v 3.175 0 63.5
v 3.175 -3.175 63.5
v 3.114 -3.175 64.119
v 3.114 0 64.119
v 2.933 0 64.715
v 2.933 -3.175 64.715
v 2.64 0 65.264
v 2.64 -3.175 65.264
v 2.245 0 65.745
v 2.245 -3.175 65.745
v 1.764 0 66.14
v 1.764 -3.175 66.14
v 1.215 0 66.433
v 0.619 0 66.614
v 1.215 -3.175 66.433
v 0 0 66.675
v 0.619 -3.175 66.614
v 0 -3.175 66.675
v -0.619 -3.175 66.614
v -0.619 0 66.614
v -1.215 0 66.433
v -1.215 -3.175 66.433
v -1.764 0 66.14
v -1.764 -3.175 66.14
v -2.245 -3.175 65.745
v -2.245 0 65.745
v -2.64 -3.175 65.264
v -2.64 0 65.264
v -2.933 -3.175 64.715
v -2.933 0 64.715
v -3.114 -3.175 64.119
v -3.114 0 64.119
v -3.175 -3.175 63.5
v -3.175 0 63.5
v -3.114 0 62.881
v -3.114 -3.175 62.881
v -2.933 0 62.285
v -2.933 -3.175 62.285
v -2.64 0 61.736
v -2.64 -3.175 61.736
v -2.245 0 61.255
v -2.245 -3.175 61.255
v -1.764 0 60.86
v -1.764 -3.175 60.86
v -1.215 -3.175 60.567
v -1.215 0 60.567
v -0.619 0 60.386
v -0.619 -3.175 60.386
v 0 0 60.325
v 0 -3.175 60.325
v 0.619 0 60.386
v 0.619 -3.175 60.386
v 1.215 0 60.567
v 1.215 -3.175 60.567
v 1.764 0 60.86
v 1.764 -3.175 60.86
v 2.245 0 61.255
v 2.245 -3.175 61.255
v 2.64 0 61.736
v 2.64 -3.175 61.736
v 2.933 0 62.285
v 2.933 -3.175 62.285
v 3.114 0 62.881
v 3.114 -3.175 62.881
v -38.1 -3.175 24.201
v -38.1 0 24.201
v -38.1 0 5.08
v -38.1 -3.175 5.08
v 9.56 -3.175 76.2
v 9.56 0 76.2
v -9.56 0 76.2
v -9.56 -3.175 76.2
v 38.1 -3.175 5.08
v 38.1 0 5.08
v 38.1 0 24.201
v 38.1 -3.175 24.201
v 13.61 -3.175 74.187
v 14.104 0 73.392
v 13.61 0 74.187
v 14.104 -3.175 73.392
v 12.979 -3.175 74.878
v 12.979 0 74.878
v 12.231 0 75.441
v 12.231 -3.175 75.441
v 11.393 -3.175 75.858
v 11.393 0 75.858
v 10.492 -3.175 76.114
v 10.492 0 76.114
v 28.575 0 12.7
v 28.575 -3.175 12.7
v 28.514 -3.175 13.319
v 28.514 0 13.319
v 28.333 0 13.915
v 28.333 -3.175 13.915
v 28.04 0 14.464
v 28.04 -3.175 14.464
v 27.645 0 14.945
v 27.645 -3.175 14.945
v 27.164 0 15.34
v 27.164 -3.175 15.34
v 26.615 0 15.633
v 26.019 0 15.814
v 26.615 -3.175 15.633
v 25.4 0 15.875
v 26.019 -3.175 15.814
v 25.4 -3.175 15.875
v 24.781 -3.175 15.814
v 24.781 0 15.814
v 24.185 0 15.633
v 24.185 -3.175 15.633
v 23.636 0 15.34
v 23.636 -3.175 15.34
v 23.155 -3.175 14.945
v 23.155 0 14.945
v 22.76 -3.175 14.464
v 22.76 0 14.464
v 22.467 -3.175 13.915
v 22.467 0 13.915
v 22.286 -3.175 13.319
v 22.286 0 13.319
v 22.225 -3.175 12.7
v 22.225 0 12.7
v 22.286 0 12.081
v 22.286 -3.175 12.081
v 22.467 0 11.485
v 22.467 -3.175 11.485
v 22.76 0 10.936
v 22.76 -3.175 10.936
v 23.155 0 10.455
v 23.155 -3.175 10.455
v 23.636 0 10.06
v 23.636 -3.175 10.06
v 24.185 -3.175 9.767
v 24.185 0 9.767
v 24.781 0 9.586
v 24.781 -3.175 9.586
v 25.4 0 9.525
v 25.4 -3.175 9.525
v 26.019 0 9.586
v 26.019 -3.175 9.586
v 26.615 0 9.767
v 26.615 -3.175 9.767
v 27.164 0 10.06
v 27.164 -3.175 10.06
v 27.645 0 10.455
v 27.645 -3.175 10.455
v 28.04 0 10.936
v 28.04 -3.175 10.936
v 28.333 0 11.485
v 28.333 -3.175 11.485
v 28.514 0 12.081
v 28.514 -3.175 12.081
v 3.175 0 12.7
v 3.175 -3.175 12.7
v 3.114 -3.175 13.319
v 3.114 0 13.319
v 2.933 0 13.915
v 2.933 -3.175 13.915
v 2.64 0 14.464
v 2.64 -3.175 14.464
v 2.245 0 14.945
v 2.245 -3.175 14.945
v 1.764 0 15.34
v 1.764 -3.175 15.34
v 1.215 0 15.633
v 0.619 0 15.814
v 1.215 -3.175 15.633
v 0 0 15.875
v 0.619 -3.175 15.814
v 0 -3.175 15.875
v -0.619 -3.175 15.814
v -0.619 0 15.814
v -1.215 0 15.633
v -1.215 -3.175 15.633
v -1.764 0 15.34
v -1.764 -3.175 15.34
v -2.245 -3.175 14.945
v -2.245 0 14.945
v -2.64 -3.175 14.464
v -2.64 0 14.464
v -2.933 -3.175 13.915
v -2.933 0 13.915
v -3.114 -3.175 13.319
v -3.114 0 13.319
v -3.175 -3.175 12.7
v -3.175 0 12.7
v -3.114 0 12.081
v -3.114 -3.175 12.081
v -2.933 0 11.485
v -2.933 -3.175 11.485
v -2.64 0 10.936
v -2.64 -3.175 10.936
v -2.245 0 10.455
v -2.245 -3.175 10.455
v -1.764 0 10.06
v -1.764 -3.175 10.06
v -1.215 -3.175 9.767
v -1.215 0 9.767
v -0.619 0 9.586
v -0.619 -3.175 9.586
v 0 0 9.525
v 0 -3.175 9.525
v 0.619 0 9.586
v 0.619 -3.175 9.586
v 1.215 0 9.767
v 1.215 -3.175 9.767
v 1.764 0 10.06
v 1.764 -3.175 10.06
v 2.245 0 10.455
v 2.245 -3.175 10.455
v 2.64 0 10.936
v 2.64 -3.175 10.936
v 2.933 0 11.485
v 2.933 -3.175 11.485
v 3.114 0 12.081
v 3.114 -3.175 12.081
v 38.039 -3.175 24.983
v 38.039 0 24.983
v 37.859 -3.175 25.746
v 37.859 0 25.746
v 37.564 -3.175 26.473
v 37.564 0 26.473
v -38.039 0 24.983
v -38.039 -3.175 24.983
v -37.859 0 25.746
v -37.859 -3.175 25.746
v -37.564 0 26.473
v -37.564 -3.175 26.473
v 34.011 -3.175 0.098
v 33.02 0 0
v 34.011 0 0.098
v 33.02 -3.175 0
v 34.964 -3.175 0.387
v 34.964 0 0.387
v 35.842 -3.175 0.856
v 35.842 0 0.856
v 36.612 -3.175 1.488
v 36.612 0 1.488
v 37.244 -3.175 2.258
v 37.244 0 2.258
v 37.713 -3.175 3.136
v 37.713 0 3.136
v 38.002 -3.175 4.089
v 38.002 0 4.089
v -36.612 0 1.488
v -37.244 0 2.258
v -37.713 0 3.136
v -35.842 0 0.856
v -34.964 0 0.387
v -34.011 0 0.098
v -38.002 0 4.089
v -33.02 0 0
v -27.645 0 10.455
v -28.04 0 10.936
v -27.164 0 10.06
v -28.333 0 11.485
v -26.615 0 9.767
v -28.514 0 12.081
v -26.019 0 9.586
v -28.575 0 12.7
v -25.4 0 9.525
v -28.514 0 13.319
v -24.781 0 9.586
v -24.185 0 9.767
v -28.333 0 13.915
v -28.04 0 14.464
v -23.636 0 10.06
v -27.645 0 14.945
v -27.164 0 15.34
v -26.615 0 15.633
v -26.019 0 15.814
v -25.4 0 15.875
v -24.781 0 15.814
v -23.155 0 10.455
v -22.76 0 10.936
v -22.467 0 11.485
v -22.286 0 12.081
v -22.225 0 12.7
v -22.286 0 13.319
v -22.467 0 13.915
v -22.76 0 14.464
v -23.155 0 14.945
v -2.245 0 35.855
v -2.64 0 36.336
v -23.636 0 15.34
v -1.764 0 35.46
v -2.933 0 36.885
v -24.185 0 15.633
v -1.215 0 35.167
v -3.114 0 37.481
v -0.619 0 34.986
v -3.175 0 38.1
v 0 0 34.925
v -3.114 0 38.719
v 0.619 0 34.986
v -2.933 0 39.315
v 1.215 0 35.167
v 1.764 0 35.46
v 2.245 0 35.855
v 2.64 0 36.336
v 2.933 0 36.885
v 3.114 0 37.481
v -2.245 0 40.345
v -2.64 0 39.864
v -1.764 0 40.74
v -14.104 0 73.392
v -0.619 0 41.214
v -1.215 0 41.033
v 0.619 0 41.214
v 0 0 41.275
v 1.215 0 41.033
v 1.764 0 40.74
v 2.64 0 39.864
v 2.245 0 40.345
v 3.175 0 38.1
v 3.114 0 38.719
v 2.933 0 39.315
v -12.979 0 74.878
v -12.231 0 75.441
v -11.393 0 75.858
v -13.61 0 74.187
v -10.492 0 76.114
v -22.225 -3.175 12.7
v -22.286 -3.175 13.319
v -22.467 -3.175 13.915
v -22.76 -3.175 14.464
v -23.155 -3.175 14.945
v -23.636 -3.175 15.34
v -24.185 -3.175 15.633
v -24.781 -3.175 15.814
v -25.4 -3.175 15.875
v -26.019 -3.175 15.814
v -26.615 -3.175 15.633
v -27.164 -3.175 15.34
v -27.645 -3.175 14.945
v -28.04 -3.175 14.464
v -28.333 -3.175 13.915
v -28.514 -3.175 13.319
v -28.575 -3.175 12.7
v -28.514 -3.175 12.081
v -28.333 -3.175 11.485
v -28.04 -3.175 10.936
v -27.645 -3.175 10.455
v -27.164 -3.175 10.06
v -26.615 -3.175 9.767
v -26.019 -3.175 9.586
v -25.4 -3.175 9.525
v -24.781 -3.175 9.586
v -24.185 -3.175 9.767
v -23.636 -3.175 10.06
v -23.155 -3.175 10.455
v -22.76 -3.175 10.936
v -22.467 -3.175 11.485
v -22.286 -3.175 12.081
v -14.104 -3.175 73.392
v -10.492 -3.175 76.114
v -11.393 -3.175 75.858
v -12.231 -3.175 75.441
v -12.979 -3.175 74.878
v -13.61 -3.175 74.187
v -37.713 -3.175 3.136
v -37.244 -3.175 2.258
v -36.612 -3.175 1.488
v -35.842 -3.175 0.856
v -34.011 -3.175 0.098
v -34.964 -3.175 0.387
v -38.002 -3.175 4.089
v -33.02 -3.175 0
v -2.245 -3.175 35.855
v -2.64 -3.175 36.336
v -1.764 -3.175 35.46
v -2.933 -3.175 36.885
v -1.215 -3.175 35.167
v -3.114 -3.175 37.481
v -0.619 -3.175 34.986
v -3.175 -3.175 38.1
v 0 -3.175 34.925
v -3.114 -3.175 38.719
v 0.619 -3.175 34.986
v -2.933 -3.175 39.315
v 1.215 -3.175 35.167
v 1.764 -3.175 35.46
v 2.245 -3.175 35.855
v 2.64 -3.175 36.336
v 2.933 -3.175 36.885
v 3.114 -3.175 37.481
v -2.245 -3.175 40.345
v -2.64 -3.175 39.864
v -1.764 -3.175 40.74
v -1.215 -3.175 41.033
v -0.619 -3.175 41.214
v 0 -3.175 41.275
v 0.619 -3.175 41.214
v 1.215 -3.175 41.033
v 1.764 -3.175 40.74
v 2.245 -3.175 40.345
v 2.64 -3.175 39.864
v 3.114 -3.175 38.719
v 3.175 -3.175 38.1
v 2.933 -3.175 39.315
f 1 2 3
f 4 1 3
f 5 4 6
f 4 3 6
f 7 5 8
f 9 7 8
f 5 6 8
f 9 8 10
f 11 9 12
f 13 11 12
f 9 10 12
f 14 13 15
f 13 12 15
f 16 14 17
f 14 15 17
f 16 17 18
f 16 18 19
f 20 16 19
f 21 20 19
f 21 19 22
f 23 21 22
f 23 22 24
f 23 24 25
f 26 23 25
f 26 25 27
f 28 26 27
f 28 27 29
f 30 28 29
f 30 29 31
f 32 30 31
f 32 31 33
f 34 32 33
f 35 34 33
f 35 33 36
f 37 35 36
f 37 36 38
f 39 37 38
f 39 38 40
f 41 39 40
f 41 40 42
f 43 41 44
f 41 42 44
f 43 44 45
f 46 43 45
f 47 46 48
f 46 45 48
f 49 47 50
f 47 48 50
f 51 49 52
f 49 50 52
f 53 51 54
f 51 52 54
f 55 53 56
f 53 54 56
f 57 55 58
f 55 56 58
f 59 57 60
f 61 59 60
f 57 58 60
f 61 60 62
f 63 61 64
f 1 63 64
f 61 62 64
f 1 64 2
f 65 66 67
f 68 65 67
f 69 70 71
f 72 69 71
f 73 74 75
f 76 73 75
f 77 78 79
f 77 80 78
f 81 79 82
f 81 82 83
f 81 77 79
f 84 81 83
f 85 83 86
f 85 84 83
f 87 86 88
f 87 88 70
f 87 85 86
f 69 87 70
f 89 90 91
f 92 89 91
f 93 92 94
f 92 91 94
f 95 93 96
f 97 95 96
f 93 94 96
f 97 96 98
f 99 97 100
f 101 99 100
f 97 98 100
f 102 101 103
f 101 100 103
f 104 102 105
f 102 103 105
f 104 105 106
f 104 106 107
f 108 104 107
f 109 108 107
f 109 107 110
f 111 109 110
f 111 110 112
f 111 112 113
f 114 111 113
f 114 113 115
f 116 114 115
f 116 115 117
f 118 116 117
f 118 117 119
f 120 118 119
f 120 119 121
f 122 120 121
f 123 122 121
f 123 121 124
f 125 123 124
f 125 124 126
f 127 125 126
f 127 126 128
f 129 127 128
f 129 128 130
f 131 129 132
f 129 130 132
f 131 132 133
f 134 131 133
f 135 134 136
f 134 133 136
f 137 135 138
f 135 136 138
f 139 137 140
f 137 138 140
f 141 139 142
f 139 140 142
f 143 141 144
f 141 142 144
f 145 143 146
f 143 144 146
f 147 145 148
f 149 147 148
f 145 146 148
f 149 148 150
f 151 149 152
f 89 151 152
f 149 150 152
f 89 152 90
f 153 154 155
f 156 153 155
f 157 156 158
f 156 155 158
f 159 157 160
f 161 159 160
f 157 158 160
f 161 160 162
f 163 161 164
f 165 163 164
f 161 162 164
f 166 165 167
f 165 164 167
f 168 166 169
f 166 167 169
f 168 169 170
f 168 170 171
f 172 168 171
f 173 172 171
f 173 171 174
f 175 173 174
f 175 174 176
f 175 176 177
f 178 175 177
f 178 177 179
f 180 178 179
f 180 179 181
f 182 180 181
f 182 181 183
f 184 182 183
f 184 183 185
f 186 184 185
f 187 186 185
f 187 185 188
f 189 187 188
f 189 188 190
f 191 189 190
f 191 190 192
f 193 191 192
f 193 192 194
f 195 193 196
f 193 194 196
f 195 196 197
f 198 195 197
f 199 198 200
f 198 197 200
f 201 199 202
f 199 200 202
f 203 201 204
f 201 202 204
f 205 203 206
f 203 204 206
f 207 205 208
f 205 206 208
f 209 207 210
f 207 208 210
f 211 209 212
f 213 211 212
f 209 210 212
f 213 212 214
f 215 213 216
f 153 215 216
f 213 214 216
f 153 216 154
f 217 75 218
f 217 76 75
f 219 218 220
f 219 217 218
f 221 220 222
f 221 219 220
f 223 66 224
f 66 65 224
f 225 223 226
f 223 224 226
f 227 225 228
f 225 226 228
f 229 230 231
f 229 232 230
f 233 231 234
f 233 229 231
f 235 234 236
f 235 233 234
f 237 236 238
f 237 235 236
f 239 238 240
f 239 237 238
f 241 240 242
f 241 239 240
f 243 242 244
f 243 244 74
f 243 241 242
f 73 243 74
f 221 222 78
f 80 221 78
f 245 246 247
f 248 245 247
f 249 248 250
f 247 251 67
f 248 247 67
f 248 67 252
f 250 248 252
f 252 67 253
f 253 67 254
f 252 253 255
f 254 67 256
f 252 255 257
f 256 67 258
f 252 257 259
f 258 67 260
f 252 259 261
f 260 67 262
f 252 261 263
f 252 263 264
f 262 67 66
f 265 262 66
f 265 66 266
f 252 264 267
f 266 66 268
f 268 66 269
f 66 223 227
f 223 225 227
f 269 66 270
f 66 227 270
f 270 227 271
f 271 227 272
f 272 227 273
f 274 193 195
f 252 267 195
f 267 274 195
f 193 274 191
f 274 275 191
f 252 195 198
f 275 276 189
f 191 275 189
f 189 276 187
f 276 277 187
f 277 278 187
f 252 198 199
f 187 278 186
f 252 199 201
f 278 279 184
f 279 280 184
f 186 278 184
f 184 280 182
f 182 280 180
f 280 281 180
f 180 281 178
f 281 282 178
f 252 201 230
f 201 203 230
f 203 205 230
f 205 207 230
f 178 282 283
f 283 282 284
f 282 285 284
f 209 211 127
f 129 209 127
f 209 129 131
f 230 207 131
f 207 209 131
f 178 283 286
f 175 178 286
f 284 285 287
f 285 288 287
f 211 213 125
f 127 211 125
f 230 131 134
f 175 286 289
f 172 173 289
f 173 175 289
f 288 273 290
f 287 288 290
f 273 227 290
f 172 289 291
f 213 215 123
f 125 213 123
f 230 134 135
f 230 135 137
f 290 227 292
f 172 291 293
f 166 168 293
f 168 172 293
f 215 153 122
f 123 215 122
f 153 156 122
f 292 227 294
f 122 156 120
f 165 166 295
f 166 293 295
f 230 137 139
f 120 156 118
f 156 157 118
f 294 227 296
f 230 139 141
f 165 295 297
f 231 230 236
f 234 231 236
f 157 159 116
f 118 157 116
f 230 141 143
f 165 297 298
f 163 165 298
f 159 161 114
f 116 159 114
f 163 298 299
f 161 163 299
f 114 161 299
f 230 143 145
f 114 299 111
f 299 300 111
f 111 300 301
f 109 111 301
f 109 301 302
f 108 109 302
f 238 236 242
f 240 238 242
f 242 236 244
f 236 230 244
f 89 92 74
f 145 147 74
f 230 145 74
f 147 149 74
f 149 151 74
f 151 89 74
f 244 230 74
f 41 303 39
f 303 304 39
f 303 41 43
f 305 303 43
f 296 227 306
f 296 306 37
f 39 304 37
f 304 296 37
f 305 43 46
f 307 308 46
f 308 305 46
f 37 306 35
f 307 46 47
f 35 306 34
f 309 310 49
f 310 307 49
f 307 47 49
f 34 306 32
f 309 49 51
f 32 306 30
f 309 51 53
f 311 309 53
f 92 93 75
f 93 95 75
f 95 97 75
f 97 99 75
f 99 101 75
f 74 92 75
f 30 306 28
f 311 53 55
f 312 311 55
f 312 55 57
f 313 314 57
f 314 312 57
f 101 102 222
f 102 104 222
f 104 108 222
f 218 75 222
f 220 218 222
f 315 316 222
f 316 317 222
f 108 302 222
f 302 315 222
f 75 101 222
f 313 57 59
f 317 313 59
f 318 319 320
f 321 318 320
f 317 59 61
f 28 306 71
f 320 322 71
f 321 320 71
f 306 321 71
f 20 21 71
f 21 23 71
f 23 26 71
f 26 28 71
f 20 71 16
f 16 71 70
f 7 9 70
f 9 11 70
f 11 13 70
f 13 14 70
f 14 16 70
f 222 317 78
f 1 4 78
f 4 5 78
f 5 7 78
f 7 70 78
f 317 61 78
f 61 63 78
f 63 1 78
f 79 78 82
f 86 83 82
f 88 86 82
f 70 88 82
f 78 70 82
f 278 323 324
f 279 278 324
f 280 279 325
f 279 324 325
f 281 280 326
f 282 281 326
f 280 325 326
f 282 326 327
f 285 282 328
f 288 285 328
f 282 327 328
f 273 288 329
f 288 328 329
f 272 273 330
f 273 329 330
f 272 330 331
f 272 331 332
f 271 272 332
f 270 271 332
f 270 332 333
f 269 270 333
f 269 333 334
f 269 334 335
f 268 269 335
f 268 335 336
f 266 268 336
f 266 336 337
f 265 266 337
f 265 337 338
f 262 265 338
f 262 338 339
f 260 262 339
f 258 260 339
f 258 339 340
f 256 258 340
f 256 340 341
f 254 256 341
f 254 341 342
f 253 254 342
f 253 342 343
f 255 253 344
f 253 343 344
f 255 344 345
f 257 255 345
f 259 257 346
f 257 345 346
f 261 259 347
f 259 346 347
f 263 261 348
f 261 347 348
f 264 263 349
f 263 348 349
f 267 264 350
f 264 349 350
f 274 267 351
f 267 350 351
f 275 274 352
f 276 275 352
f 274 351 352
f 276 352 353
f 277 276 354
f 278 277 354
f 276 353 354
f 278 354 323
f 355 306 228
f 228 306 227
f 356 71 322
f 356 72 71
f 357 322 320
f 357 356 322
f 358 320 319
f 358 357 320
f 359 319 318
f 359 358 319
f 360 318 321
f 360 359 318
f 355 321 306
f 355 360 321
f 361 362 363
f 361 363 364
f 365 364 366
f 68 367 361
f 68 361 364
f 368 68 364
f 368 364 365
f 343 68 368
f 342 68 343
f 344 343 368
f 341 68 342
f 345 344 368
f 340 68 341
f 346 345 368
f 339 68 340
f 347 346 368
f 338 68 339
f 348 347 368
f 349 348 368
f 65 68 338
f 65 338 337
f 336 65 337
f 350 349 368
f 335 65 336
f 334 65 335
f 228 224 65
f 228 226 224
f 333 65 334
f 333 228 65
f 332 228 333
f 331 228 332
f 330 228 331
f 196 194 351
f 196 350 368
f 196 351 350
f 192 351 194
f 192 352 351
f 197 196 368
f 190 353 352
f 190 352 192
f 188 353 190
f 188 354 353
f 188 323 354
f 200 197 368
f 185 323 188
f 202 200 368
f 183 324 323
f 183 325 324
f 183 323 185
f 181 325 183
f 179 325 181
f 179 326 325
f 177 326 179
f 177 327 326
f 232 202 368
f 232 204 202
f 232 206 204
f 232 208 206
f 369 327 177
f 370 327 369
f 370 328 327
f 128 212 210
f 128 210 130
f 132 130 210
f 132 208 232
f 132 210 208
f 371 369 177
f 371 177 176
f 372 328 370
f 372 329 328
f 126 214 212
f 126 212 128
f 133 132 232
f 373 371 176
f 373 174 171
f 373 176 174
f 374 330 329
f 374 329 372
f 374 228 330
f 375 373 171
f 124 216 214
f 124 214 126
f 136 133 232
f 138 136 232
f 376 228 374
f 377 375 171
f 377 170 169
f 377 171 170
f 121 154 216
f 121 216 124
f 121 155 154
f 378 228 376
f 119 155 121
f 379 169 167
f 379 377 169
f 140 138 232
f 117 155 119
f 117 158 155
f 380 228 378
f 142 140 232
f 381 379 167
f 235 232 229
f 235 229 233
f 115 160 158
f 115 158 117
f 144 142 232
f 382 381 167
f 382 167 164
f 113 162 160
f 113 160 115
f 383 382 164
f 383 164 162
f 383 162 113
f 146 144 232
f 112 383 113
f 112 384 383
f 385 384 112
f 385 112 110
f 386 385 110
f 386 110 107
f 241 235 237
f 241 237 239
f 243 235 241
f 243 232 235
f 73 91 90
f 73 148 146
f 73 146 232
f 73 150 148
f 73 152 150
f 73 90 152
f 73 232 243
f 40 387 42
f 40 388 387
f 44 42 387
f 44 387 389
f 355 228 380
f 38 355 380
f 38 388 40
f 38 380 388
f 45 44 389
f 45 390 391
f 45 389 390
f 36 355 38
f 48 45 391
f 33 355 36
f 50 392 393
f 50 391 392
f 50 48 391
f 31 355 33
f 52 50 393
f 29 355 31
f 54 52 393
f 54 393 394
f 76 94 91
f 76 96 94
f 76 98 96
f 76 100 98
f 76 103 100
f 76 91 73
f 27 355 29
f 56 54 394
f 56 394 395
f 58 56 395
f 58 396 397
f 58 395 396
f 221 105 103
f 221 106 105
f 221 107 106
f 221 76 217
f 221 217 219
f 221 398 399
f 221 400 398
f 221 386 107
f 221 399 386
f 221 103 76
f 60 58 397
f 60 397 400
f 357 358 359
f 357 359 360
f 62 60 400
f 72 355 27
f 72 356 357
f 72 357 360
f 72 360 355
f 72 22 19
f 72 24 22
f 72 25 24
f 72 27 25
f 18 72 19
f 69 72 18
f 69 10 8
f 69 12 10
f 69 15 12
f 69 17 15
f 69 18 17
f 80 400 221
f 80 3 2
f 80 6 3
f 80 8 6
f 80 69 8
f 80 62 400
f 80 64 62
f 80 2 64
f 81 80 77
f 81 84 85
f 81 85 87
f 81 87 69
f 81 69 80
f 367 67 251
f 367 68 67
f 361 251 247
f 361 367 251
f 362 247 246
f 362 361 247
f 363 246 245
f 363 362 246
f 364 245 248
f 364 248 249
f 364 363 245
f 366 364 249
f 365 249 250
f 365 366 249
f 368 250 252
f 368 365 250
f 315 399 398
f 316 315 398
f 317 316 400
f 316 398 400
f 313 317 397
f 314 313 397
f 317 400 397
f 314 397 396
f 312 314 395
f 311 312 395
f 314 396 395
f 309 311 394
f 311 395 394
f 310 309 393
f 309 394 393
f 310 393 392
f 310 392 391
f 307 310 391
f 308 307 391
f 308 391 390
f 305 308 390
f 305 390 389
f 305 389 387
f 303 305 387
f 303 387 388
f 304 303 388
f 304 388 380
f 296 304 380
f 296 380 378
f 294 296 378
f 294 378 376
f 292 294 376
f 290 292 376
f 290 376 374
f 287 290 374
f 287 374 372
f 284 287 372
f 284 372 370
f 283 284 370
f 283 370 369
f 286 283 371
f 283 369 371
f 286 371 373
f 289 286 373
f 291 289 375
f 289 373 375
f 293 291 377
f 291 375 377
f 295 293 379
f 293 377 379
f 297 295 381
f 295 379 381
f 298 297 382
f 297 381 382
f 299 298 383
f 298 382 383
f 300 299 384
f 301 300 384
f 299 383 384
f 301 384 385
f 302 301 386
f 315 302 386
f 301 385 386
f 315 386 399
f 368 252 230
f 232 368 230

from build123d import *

# Parameters (mm, degrees)
F1_DEPTH = 3.175
F2_R     = 5.08
F4_D     = 6.35


with BuildPart() as f1:
    # F0 (on Front) → F1 (new body)
    with BuildSketch(Plane.XZ):
        Polygon((-38.1, 25.4), (-38.1, 0), (38.1, 0), (38.1, 25.4), (12.7, 76.2), (-12.7, 76.2), align=None)
    extrude(amount=F1_DEPTH)

    # F2
    f2_edges = [f1.edges().sort_by_distance(p)[0] for p in [
        (12.7, -1.5875, 76.2),
        (-12.7, -1.5875, 76.2),
        (38.1, -1.5875, 25.4),
        (38.1, -1.5875, 0),
        (-38.1, -1.5875, 25.4),
        (-38.1, -1.5875, 0),
    ]]
    fillet(f2_edges, radius=F2_R)

    # F4 (through all)
    with Locations(Plane(origin=(0, 0, 0), x_dir=(-1, 0, 0), z_dir=(0, 1, 0))):
        with Locations((-25.4, 12.7), (0, 12.7), (25.4, 12.7), (0, 38.1), (0, 63.5)):
            Hole(F4_D / 2)


solid = f1.part
